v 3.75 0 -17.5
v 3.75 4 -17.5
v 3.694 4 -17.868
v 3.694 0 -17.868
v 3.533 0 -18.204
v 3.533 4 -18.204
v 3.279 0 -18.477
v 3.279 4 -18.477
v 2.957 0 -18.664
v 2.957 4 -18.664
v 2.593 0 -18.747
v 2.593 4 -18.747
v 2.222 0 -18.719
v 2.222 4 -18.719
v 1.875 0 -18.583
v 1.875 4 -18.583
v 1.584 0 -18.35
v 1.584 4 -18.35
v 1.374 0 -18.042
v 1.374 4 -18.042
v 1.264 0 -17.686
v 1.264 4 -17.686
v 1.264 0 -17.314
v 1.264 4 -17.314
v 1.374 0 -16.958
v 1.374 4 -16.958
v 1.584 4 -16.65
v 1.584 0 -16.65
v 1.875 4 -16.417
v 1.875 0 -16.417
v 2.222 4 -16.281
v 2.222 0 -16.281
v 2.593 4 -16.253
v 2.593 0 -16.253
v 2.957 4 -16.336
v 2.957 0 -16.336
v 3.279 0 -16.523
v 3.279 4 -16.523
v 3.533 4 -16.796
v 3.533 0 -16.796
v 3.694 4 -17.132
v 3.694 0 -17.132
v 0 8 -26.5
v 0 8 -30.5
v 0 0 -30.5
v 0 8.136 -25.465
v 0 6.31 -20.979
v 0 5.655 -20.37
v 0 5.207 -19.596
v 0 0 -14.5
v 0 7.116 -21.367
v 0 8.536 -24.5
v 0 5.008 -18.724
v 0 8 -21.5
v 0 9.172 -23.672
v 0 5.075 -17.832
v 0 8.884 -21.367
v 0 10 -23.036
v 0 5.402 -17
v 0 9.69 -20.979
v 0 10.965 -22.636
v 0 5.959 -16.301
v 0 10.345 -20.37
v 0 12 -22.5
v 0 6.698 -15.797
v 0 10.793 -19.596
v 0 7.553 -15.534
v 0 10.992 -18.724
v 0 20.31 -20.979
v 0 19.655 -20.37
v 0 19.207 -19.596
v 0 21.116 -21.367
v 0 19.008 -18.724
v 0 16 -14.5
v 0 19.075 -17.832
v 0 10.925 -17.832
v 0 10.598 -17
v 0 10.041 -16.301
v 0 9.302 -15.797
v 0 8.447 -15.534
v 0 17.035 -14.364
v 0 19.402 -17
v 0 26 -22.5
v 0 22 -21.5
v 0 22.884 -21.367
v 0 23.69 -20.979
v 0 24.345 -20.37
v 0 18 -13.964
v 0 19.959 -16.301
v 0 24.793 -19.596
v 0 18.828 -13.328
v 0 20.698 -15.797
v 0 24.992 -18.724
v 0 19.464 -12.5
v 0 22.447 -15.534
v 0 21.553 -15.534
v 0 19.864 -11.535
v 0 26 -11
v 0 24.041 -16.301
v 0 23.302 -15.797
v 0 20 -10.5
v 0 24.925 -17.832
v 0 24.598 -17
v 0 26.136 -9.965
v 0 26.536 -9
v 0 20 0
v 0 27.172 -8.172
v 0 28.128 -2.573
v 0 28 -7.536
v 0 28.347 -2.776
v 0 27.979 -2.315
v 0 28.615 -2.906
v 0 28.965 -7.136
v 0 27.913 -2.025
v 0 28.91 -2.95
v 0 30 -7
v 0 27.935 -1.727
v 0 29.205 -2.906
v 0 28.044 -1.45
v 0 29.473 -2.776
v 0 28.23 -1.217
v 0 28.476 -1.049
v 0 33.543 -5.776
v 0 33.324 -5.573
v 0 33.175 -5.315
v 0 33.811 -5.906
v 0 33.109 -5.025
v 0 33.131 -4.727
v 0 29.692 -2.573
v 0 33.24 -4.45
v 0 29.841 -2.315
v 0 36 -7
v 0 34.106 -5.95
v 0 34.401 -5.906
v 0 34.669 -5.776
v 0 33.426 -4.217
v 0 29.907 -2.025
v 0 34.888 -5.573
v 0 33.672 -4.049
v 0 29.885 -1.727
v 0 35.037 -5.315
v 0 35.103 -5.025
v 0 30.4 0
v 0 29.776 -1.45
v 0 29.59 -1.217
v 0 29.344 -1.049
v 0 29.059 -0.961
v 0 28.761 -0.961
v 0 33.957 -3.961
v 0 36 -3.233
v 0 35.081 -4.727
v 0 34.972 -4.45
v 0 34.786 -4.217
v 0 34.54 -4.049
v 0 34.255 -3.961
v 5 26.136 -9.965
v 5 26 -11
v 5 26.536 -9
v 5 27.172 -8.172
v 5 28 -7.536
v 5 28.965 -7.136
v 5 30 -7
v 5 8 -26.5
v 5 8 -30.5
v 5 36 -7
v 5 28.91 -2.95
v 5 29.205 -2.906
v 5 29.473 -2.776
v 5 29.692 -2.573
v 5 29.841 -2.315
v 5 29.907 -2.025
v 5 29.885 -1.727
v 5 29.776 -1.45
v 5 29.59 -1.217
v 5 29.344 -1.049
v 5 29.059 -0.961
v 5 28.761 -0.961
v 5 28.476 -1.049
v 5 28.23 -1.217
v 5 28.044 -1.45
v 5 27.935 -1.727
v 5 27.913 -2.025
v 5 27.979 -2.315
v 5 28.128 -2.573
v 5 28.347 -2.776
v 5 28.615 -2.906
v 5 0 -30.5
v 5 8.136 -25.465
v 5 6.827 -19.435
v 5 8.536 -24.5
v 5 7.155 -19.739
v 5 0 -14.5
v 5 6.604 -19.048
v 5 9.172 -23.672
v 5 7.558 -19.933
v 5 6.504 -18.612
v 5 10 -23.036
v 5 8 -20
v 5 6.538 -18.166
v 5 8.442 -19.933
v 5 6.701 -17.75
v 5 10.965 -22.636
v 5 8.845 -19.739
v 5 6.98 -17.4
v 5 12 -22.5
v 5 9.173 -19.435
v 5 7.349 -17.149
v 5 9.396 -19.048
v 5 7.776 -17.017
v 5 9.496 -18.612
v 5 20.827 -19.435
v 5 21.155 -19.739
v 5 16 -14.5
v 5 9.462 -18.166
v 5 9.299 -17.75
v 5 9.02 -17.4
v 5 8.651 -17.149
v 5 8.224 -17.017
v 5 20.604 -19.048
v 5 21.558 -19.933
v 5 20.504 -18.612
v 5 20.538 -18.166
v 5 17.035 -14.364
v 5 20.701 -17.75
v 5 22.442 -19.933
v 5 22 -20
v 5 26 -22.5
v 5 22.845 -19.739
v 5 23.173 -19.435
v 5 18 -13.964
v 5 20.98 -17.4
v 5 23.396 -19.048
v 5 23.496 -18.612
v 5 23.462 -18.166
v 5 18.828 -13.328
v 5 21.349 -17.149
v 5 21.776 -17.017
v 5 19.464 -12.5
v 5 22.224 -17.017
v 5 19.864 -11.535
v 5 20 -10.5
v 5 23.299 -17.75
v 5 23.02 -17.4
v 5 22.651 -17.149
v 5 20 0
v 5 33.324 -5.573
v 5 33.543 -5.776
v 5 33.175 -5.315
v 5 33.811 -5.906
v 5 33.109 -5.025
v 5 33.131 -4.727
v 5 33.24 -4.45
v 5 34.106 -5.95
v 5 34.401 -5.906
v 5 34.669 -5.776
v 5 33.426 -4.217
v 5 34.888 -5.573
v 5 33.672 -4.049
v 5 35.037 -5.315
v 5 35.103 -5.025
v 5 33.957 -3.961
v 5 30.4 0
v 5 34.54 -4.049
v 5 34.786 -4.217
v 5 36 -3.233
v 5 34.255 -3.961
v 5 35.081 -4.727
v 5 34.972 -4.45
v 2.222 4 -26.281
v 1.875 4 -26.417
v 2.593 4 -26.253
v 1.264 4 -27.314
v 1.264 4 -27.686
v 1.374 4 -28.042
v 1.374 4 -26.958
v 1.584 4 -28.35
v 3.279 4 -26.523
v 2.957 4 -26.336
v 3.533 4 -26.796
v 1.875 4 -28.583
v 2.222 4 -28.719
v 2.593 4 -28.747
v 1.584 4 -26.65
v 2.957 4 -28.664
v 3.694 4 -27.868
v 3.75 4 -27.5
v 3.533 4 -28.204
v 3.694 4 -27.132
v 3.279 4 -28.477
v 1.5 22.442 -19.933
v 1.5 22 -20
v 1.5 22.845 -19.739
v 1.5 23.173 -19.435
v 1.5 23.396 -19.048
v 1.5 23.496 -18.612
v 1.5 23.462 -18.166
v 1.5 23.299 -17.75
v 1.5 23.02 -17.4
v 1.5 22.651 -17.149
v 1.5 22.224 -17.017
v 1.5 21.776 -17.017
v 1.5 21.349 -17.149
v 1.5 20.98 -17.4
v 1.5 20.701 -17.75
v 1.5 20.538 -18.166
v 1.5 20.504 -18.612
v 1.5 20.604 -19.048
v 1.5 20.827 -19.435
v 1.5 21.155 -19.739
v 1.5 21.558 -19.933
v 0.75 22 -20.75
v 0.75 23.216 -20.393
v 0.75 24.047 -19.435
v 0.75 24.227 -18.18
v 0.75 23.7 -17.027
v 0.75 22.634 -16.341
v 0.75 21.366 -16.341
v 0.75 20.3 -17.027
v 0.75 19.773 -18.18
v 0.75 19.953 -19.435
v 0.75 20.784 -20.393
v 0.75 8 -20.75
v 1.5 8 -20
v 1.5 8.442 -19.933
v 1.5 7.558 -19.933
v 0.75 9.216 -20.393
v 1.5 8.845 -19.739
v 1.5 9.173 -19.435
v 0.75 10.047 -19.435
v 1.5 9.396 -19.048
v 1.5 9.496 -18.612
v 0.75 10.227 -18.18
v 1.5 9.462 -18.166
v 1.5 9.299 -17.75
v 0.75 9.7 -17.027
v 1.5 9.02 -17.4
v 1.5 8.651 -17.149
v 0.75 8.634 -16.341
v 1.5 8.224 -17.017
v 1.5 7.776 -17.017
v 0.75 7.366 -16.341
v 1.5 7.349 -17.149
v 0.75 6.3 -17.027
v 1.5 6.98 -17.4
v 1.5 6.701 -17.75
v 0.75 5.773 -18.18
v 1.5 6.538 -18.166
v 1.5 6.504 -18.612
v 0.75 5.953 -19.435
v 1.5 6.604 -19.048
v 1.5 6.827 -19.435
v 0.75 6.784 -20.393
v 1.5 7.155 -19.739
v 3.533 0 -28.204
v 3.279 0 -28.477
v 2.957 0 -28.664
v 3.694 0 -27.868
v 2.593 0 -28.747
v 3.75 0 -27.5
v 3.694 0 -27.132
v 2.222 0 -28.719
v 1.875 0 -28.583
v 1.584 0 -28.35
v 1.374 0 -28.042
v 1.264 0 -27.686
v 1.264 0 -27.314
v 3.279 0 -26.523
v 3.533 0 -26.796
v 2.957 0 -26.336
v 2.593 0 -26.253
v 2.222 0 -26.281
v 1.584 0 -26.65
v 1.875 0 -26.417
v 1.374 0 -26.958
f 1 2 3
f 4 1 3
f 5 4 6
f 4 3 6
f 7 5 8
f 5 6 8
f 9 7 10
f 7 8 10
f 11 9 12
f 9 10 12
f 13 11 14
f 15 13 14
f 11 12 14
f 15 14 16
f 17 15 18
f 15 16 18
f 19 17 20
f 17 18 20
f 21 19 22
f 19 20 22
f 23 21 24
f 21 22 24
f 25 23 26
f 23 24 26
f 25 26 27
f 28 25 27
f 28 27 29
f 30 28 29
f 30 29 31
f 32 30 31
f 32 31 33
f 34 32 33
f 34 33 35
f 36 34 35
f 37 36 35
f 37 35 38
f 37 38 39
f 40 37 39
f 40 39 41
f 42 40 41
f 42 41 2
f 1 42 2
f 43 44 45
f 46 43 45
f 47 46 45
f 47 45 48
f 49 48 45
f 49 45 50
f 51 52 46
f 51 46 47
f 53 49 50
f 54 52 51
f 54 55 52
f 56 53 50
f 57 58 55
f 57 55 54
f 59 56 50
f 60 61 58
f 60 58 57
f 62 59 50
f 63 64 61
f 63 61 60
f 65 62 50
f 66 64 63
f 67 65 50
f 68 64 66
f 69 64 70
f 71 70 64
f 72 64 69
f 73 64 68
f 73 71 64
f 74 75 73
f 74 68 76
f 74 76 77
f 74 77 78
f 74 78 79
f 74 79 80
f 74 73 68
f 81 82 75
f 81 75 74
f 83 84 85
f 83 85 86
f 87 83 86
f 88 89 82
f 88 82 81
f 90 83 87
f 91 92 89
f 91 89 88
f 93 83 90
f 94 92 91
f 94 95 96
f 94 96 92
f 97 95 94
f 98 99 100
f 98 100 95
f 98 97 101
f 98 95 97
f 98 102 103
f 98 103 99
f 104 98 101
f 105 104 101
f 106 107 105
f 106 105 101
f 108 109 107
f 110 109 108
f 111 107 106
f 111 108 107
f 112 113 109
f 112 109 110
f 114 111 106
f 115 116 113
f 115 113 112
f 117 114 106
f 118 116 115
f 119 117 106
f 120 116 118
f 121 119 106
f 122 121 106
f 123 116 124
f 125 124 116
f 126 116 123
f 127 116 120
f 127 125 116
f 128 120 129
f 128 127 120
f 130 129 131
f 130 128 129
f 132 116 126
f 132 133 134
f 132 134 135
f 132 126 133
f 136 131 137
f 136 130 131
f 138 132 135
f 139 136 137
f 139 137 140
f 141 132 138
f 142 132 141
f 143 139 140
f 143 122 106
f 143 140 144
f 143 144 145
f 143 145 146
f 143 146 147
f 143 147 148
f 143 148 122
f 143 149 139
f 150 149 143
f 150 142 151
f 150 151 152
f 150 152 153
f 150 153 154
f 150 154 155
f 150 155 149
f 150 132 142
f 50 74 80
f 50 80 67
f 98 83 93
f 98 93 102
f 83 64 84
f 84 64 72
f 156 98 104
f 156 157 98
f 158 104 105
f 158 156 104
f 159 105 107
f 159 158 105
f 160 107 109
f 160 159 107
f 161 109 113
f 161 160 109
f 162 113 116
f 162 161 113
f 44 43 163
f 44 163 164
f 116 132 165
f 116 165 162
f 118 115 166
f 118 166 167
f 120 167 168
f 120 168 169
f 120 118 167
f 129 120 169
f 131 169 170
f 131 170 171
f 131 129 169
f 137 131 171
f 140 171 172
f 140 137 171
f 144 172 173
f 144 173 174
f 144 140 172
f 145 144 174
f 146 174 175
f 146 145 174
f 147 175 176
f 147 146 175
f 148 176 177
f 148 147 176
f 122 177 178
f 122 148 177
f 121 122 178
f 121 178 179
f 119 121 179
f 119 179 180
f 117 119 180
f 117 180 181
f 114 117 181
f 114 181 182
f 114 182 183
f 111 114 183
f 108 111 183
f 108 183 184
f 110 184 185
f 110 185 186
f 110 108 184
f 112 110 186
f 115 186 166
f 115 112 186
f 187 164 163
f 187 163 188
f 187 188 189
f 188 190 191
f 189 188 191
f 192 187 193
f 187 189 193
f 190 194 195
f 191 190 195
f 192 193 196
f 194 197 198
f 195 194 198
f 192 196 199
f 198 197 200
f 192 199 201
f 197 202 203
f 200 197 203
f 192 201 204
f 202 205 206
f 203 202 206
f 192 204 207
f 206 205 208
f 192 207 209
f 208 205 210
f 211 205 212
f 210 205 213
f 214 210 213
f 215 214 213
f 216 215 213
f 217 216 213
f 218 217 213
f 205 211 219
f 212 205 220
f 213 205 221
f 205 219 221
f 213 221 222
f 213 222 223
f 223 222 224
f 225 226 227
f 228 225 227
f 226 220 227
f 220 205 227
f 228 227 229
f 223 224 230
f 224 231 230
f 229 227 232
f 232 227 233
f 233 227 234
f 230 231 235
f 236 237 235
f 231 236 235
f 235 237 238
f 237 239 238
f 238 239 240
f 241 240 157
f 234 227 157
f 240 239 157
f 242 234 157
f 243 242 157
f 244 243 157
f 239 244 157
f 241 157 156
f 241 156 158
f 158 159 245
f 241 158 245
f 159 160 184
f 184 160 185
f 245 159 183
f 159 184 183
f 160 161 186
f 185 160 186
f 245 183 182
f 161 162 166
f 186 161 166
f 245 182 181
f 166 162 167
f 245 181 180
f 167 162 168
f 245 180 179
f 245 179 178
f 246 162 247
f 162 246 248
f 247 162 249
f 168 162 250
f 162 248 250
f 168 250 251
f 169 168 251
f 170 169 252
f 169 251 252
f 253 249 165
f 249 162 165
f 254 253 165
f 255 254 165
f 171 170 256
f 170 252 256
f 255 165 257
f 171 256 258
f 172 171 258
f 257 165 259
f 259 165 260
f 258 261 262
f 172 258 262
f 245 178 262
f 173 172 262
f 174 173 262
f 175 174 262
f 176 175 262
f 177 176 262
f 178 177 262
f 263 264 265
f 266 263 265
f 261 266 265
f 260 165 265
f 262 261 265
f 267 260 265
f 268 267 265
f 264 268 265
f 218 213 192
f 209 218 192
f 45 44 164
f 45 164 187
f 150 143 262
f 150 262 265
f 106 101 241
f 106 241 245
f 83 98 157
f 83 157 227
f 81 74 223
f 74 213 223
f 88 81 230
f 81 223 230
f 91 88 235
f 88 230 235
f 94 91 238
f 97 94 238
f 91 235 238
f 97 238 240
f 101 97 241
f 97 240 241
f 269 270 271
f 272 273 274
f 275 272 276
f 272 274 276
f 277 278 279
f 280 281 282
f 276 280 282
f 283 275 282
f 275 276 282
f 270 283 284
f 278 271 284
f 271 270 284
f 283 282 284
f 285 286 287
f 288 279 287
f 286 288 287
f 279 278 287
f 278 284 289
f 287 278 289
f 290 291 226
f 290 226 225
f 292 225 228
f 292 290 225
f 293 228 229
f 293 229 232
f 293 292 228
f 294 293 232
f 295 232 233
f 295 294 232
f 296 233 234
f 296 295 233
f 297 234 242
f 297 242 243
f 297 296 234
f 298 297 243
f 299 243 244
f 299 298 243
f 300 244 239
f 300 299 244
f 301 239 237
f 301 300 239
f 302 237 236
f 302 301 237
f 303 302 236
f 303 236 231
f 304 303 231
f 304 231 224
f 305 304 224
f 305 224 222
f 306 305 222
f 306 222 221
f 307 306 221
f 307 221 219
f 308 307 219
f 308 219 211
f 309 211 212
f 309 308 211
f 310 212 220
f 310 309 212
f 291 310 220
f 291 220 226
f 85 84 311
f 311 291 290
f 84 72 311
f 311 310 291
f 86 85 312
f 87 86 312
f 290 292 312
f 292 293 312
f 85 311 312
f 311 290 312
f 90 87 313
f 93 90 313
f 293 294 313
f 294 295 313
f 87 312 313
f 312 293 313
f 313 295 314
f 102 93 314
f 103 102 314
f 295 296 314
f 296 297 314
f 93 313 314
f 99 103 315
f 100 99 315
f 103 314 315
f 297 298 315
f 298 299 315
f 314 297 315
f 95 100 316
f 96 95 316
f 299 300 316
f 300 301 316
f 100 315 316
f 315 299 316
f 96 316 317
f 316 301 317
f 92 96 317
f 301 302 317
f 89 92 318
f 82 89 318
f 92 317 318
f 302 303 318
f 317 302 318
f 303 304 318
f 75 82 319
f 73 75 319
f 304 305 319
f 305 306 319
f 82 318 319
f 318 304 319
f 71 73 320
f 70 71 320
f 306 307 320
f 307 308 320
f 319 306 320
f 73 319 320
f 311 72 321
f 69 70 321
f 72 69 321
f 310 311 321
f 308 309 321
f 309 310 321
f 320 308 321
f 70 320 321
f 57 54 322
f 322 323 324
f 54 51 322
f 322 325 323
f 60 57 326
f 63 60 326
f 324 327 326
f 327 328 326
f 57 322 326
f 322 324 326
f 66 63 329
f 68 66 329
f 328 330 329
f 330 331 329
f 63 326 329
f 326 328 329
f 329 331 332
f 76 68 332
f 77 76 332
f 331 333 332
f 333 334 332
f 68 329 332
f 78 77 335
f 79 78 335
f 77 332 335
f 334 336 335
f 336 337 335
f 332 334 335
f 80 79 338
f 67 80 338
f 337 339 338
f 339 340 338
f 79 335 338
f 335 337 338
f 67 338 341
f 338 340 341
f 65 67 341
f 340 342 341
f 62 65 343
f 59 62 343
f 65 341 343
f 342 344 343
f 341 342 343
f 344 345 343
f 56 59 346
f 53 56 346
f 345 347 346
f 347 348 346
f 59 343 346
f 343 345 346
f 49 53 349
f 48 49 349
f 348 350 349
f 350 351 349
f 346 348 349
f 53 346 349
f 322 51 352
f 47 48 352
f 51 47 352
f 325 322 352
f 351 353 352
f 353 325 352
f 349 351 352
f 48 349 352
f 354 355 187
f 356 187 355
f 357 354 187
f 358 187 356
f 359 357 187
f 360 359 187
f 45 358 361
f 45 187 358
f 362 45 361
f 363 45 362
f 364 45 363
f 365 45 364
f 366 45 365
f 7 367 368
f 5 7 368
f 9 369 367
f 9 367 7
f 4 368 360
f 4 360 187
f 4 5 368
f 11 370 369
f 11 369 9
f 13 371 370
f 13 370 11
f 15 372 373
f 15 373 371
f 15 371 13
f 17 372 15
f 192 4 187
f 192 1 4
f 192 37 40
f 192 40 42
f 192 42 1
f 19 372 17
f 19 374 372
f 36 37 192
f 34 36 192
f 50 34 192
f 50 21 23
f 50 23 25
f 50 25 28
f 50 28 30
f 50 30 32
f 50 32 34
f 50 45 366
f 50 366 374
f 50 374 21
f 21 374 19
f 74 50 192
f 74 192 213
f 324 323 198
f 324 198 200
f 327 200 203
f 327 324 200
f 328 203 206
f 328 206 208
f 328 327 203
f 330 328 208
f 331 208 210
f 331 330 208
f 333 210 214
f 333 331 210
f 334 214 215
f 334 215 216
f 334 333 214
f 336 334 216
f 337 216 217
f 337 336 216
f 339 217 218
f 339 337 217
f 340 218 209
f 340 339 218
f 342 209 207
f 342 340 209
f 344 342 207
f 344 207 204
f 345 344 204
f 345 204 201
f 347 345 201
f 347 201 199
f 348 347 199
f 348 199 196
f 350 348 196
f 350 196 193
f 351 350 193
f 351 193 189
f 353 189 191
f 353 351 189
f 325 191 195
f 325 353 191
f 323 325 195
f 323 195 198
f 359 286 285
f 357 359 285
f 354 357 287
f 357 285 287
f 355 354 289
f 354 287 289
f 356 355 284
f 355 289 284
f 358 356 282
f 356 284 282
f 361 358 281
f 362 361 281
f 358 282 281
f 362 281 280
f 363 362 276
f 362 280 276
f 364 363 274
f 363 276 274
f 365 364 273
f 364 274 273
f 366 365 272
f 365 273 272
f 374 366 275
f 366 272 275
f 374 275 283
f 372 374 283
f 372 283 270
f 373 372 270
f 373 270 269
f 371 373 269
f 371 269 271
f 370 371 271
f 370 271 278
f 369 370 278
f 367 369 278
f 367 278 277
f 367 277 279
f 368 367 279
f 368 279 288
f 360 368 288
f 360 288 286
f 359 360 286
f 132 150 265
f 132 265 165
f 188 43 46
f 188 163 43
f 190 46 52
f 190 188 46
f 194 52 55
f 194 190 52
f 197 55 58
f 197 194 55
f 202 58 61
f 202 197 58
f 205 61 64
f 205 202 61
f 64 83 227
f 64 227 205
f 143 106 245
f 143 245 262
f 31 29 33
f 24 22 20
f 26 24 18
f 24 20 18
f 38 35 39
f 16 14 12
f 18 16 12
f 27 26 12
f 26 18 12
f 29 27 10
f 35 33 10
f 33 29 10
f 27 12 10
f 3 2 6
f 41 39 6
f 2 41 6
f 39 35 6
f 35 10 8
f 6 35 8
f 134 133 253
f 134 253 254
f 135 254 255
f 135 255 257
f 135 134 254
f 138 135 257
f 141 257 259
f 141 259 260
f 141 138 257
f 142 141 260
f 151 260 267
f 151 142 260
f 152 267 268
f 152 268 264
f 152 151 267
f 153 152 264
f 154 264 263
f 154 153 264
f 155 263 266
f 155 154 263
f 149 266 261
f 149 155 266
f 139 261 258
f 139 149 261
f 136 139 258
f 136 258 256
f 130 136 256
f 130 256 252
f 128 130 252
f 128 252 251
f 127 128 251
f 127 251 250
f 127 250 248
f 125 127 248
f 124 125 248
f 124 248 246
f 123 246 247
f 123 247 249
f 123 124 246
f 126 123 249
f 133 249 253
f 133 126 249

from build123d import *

# Parameters (mm, degrees)
SKETCH1_R                       = 1.5
SKETCH1_R_2                     = 1
BOSS_EXTRUDE1_DEPTH             = 5
FILLET1_R                       = 4
TAP_DRILL_FOR_M3X0_5_TAP1_D     = 2.5
TAP_DRILL_FOR_M3X0_5_TAP1_DEPTH = 4
CHAMFER1_SIZE                   = 1.5


with BuildPart() as part:
    # Sketch1 → Boss-Extrude1 (new body)
    with BuildSketch(Plane(origin=(0, 0, 0), x_dir=(0, 0, -1), z_dir=(1, 0, 0))):
        Polygon((30.5, 0), (14.5, 0), (14.5, 20), (0, 20), (0, 30.4), (3.233161507, 36), (7, 36), (7, 26), (22.5, 26), (22.5, 8), (30.5, 8), align=None)
        with Locations((18.5, 8)):
            Circle(SKETCH1_R, mode=Mode.SUBTRACT)
        with Locations((18.5, 22)):
            Circle(SKETCH1_R, mode=Mode.SUBTRACT)
        with Locations((1.95, 28.91)):
            Circle(SKETCH1_R_2, mode=Mode.SUBTRACT)
        with Locations((4.95, 34.106152423)):
            Circle(SKETCH1_R_2, mode=Mode.SUBTRACT)
    extrude(amount=BOSS_EXTRUDE1_DEPTH)

    # Fillet1
    fillet1_edges = [part.edges().sort_by_distance(p)[0] for p in [
        (2.5, 20, -14.5),
        (2.5, 26, -7),
        (2.5, 8, -22.5),
    ]]
    fillet(fillet1_edges, radius=FILLET1_R)

    # Tap Drill for M3x0.5 Tap1
    with Locations(Plane(origin=(0, 0, 0), x_dir=(-1, 0, 0), z_dir=(0, -1, 0))):
        with Locations((-2.5, 17.5), (-2.5, 27.5)):
            Hole(TAP_DRILL_FOR_M3X0_5_TAP1_D / 2, depth=TAP_DRILL_FOR_M3X0_5_TAP1_DEPTH)

    # Chamfer1
    chamfer1_edges = [part.edges().sort_by_distance(p)[0] for p in [
        (0, 8, -17),
        (0, 22, -17),
    ]]
    chamfer(chamfer1_edges, length=CHAMFER1_SIZE)


solid = part.part
